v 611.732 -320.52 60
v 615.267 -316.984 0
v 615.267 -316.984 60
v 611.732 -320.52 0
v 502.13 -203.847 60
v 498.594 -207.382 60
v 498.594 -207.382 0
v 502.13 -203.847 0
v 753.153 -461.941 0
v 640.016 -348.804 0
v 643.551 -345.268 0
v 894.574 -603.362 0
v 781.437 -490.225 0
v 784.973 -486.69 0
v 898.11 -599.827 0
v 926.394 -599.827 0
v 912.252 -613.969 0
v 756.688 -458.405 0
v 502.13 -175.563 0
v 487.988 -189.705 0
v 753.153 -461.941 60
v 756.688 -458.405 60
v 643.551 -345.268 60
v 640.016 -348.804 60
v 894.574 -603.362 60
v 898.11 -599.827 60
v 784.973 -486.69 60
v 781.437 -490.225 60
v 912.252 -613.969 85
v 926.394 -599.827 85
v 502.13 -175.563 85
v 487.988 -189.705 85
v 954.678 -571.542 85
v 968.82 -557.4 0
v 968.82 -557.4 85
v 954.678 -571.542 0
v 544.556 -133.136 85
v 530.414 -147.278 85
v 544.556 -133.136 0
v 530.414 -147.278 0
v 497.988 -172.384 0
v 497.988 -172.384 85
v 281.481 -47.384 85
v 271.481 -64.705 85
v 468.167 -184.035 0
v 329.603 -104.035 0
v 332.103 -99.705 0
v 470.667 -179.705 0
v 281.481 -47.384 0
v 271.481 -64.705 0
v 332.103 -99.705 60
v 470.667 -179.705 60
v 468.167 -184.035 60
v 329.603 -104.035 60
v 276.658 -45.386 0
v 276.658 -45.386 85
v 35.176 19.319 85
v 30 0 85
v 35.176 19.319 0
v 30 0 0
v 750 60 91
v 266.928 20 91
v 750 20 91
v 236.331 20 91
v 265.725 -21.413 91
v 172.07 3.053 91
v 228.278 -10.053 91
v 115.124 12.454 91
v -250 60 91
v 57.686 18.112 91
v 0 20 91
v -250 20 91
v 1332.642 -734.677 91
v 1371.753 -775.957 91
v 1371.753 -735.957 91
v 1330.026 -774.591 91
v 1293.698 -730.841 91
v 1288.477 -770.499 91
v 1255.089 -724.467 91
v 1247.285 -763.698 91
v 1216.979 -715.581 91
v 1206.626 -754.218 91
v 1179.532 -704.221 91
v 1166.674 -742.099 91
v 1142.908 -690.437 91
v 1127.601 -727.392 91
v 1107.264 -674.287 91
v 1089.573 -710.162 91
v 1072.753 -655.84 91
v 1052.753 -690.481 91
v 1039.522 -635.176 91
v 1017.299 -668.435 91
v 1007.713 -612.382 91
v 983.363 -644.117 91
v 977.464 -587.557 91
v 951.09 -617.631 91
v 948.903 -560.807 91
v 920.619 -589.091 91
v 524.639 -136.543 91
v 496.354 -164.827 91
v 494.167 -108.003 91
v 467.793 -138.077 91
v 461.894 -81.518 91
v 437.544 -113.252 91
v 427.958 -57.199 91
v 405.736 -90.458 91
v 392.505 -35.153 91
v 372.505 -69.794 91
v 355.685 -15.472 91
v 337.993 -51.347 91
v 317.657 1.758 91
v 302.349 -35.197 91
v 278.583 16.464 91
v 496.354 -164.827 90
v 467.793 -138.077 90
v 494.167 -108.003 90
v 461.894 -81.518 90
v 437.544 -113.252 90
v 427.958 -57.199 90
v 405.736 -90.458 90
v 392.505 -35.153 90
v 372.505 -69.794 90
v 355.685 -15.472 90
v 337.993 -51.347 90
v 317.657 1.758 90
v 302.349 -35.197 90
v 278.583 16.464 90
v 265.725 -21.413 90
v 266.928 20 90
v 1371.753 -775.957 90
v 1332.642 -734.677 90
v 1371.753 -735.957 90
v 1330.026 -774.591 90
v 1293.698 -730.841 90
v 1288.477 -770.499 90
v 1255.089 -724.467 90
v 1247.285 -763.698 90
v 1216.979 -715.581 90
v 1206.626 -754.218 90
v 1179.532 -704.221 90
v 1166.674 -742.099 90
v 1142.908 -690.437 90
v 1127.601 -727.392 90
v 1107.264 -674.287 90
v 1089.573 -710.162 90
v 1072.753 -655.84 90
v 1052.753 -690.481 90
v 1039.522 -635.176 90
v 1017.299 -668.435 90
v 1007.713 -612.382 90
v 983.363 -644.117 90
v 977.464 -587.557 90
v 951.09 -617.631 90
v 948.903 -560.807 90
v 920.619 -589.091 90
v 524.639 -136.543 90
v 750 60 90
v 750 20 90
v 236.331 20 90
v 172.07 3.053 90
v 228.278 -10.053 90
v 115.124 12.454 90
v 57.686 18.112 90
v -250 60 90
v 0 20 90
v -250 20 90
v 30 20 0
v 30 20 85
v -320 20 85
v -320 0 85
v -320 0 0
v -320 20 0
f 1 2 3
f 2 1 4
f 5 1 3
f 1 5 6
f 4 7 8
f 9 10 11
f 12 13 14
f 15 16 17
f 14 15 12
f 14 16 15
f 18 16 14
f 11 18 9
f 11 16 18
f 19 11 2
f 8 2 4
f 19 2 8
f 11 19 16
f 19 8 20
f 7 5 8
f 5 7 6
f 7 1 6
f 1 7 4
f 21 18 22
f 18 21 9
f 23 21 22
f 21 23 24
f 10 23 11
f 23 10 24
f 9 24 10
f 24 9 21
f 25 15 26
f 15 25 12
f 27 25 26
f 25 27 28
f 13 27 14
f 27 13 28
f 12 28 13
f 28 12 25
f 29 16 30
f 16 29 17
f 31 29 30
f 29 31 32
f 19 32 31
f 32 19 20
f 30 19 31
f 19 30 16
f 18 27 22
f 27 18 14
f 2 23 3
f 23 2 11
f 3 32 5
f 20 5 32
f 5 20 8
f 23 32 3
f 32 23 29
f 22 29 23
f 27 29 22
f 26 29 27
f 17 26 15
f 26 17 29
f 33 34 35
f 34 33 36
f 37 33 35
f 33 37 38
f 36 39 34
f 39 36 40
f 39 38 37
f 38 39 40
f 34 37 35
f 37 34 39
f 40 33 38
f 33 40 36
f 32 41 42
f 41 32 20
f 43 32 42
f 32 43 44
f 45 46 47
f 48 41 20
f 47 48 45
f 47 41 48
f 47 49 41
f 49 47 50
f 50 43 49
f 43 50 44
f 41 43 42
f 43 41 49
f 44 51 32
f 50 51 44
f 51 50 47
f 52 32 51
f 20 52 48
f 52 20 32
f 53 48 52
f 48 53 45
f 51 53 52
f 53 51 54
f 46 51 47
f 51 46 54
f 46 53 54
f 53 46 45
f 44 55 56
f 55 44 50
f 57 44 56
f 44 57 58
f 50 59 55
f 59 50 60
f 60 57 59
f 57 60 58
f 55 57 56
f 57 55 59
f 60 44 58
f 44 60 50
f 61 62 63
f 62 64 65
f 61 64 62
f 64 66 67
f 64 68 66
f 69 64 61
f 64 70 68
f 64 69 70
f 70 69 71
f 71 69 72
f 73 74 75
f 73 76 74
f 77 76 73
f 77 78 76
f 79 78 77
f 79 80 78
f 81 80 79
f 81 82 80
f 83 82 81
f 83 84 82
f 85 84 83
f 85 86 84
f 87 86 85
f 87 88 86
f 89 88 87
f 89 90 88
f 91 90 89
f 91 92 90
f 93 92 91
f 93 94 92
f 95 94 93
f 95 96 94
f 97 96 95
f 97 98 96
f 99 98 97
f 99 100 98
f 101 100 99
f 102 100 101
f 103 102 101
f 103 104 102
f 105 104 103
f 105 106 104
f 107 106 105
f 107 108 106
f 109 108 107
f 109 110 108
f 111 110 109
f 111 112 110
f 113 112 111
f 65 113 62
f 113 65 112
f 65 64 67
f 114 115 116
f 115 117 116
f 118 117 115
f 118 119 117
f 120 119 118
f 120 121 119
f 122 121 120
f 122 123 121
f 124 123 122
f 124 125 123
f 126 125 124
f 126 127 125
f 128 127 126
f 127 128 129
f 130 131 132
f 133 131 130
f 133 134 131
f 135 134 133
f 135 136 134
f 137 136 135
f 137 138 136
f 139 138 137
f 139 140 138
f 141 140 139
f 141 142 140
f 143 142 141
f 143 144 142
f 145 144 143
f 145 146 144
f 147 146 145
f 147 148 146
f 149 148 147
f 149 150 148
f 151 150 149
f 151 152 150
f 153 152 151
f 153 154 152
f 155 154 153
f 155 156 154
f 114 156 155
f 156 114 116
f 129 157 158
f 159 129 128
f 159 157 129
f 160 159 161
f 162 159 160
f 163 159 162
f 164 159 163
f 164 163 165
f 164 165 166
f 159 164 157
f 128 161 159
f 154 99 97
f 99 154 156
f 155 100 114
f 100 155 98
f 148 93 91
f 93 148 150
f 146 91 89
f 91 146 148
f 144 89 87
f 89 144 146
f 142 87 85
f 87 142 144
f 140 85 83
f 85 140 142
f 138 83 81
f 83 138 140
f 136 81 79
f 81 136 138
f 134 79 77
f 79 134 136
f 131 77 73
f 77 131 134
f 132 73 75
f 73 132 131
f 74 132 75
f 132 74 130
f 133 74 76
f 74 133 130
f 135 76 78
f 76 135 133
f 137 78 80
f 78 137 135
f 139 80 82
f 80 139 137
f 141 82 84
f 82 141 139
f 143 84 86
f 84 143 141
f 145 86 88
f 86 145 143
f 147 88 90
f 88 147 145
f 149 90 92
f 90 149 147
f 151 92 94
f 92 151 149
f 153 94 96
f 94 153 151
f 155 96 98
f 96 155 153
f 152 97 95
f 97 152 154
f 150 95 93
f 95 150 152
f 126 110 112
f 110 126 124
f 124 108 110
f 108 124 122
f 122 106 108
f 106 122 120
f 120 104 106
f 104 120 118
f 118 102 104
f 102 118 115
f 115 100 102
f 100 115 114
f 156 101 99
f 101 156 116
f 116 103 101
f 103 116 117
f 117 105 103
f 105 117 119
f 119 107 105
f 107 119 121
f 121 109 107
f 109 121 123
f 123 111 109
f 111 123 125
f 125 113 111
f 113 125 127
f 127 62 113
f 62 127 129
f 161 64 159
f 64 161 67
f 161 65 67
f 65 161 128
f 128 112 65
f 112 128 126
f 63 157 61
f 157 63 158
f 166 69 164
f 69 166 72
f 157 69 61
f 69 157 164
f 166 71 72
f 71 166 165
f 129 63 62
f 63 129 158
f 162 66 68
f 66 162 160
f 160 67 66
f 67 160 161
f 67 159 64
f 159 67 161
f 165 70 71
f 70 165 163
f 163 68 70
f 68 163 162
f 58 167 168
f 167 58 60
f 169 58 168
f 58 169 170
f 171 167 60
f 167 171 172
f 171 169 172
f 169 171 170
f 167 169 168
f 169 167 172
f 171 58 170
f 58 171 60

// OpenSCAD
 

module sector(radius, angles, fn = 96) {
    step = -360 / fn;

    points = concat([[0, 0]],
        [for(a = [angles[0] : step : angles[1] - 360]) 
            [radius * cos(a), radius * sin(a)]
        ],
        [[radius * cos(angles[1]), radius * sin(angles[1])]]
    );

    difference() {
        circle(radius, $fn = fn);
        polygon(points);
    }
}

module arc(radius, angle, width = 40) {
    angles = [ 90, 90- angle];
    linear_extrude(1)
    translate([0,-radius,0]) 
    difference() {
        sector(radius + width/2, angles);
        sector(radius - width/2, angles);
    }
} 

module ptranslate( radius, angle ) {
    translate([(sin(angle))*radius,(cos(angle)-1)*radius,0]) 
        rotate([0,0,-angle])
            children();
}
 
translate([-320,0,0]) cube([350,20,85]);
translate([30,0,0]) rotate(-15) {
    color([1,0,0])cube([250,20,85]);
    translate([250,0,0]) rotate(-15) {
        color([1,1,0])cube([250,20,85]);
        color([0,1,0]) translate([70,-5,0]) cube([160,10,60]);
        translate([250,0,0]) rotate(-15) {
            color([0,0,1]) cube([600,20,85]);
            color([0,1,1]) translate([0,60,0]) cube([600,20,85]);
            color([0,1,0]) {
                translate([20,-5,0]) cube([160,10,60]);
                translate([220,-5,0]) cube([160,10,60]);
                translate([420,-5,0]) cube([160,10,60]);
            }
        }
    }
}

translate([0,40,90]) {
    color ([0,1,0]) translate([-250,-20,0]) cube([1000,40,1]);
    
    color ([1,0,0]) arc(902,15);
    ptranslate(902, 15) {
        arc(618,30);
        ptranslate(618,30) {
            translate([0,-20,0]) color ([0,1,0]) cube([600,40,1]);
            translate([600,0,0]) mirror([0,1,0]) arc(618,45);
        }
    }
         
}
